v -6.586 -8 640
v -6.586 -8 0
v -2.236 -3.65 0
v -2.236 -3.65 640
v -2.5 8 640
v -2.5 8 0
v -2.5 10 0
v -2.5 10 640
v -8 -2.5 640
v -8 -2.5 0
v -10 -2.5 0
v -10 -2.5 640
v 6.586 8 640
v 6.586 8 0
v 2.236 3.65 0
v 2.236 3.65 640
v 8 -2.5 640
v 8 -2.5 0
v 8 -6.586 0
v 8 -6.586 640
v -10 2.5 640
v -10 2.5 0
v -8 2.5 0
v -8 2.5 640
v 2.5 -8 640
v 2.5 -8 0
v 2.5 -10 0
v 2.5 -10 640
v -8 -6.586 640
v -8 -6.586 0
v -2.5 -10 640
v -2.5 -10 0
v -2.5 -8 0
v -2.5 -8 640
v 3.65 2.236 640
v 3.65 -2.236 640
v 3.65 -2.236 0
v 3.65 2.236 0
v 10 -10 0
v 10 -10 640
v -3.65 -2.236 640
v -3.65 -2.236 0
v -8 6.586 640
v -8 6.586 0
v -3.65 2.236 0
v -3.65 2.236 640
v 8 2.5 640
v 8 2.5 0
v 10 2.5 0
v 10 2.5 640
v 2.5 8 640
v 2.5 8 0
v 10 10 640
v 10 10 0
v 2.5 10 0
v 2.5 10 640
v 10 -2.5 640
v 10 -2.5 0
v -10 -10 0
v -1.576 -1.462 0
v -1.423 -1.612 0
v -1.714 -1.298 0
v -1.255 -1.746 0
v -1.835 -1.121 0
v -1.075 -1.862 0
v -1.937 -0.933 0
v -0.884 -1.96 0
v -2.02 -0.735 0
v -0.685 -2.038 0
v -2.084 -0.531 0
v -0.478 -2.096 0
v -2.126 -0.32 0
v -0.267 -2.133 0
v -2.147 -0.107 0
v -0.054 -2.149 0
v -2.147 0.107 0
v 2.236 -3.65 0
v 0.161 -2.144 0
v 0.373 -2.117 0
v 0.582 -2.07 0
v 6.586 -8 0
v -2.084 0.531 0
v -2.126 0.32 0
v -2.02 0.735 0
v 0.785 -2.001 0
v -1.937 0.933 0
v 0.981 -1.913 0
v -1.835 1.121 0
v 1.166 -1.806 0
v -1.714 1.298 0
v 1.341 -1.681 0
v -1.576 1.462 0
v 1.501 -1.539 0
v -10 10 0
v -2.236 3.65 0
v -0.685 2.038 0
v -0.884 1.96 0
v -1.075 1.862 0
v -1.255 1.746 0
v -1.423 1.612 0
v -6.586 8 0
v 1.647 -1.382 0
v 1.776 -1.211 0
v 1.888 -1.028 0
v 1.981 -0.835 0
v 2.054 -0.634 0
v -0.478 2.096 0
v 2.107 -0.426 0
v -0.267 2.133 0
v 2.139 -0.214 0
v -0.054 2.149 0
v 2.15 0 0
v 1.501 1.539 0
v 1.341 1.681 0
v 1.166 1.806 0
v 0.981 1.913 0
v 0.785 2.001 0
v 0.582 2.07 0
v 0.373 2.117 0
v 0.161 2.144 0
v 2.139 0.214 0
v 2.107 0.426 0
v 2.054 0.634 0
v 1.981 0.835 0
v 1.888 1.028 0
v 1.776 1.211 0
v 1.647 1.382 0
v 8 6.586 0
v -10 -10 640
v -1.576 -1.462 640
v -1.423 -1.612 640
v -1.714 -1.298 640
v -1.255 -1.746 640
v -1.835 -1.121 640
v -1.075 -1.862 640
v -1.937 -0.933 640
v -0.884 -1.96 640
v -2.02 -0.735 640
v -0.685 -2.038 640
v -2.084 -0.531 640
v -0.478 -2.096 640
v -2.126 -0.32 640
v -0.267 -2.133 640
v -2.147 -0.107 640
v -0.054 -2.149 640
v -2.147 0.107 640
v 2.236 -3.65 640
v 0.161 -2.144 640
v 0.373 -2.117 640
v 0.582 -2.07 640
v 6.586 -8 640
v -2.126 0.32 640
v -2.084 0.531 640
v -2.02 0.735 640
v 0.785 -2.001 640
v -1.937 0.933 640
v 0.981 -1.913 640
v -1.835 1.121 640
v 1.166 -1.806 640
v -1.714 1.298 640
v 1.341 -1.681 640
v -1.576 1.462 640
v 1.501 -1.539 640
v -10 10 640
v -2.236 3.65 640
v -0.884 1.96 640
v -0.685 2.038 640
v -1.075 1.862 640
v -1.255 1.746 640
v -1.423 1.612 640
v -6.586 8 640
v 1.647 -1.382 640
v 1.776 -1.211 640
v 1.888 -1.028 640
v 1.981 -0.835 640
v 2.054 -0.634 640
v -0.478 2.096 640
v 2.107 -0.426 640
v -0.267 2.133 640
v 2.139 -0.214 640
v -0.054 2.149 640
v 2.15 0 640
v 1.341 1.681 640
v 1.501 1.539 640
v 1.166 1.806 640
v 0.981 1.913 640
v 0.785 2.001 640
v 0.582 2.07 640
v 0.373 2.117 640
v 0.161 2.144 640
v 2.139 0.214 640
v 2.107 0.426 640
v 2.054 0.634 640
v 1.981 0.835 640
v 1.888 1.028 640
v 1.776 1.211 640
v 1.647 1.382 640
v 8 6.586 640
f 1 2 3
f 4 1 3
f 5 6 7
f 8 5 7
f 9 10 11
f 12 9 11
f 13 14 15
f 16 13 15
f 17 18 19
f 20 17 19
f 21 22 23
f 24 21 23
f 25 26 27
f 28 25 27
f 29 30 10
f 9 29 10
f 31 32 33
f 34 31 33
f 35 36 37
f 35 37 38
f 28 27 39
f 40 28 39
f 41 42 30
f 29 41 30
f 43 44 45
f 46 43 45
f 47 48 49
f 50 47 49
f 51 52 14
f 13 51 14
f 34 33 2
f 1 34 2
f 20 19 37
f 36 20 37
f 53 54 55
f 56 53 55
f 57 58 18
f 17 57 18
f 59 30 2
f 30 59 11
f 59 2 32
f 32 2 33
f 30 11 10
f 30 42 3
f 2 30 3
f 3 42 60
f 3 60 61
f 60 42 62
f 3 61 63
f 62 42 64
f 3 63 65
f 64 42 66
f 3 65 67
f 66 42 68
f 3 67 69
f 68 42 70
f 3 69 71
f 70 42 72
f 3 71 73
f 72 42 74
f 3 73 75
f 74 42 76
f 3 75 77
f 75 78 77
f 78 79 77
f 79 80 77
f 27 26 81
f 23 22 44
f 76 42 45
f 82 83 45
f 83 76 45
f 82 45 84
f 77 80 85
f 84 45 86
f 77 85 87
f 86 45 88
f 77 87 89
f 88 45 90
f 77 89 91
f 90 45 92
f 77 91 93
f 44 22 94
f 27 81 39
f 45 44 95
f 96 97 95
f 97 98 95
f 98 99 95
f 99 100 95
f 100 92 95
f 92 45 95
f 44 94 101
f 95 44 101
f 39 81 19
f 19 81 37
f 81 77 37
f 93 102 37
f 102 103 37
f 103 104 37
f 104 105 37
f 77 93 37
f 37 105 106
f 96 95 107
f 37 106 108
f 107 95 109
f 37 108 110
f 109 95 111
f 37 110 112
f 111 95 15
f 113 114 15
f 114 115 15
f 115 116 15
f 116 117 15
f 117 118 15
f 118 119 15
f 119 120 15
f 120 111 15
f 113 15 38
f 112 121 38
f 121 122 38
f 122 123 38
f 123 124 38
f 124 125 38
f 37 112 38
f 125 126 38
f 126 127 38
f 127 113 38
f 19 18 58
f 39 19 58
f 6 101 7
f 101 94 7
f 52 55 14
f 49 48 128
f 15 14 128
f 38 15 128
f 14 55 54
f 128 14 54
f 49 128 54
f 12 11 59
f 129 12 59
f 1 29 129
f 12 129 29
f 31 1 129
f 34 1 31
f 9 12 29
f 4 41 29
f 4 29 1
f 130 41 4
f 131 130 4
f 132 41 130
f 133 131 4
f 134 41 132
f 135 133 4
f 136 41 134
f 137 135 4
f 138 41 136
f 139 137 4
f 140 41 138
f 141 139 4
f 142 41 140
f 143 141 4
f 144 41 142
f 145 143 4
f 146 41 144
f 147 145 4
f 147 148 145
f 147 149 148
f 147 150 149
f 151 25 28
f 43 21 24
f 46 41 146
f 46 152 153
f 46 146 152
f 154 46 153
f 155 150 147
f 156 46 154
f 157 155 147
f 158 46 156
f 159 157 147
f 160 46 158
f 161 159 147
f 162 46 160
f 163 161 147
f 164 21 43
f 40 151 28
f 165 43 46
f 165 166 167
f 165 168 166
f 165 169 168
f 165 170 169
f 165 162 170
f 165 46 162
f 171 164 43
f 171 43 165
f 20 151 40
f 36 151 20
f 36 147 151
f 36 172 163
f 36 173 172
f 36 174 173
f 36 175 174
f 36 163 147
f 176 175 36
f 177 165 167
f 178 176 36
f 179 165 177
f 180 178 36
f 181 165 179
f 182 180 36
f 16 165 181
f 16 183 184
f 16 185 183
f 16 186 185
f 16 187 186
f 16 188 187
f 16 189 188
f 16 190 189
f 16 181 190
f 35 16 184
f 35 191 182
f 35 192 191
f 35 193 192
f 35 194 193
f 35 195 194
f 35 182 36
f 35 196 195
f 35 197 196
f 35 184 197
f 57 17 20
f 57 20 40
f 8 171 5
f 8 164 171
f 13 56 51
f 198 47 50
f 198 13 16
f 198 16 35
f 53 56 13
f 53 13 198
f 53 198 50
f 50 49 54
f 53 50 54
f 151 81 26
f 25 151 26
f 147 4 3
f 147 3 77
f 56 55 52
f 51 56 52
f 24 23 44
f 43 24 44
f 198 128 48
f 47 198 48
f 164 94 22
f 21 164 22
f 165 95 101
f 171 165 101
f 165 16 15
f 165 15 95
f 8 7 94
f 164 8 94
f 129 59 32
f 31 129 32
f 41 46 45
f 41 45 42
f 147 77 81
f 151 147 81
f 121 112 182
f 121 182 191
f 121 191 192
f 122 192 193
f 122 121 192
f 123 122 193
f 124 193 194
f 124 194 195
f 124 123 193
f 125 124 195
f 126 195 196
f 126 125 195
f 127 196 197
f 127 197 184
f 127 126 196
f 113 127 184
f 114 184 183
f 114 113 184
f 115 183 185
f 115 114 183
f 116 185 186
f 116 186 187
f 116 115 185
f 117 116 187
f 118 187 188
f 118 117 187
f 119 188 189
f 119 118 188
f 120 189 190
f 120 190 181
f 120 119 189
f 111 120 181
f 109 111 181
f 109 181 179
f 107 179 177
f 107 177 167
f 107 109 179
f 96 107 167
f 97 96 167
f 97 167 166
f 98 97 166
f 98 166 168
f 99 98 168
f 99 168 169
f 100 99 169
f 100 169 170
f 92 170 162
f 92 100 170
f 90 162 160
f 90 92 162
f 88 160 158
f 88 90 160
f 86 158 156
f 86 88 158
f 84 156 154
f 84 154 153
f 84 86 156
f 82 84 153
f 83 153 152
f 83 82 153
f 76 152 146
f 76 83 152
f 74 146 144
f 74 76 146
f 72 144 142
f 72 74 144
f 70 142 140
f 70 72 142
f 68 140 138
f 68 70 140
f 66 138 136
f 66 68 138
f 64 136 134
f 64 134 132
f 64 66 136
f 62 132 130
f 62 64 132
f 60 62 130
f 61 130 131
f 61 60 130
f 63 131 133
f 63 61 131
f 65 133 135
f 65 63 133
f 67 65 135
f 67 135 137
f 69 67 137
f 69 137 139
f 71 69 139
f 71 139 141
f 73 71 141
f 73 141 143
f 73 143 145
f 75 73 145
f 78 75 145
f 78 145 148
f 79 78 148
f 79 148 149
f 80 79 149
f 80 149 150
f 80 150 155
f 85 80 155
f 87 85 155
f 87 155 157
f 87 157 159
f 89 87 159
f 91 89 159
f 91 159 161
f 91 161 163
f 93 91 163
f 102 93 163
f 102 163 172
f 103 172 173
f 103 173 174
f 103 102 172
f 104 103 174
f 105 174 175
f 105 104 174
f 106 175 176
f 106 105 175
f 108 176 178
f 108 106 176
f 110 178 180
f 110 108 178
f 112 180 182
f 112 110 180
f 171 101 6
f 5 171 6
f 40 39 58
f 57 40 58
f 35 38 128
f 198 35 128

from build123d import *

# Parameters (mm, degrees)
ESQUISSE1_R        = 2.15
BOSS_EXTRU_1_DEPTH = 640


with BuildPart() as part:
    # Esquisse1 → Boss.-Extru.1 (new body)
    with BuildSketch(Plane.XY):
        Polygon((-2.5, 10), (-10, 10), (-10, 2.5), (-8, 2.5), (-8, 6.585786438), (-3.65, 2.235786438), (-3.65, -2.235786438), (-8, -6.585786438), (-8, -2.5), (-10, -2.5), (-10, -10), (-2.5, -10), (-2.5, -8), (-6.585786438, -8), (-2.235786438, -3.65), (2.235786438, -3.65), (6.585786438, -8), (2.5, -8), (2.5, -10), (10, -10), (10, -2.5), (8, -2.5), (8, -6.585786438), (3.65, -2.235786438), (3.65, 2.235786438), (8, 6.585786438), (8, 2.5), (10, 2.5), (10, 10), (2.5, 10), (2.5, 8), (6.585786438, 8), (2.235786438, 3.65), (-2.235786438, 3.65), (-6.585786438, 8), (-2.5, 8), align=None)
        Circle(ESQUISSE1_R, mode=Mode.SUBTRACT)
    extrude(amount=BOSS_EXTRU_1_DEPTH)


solid = part.part
